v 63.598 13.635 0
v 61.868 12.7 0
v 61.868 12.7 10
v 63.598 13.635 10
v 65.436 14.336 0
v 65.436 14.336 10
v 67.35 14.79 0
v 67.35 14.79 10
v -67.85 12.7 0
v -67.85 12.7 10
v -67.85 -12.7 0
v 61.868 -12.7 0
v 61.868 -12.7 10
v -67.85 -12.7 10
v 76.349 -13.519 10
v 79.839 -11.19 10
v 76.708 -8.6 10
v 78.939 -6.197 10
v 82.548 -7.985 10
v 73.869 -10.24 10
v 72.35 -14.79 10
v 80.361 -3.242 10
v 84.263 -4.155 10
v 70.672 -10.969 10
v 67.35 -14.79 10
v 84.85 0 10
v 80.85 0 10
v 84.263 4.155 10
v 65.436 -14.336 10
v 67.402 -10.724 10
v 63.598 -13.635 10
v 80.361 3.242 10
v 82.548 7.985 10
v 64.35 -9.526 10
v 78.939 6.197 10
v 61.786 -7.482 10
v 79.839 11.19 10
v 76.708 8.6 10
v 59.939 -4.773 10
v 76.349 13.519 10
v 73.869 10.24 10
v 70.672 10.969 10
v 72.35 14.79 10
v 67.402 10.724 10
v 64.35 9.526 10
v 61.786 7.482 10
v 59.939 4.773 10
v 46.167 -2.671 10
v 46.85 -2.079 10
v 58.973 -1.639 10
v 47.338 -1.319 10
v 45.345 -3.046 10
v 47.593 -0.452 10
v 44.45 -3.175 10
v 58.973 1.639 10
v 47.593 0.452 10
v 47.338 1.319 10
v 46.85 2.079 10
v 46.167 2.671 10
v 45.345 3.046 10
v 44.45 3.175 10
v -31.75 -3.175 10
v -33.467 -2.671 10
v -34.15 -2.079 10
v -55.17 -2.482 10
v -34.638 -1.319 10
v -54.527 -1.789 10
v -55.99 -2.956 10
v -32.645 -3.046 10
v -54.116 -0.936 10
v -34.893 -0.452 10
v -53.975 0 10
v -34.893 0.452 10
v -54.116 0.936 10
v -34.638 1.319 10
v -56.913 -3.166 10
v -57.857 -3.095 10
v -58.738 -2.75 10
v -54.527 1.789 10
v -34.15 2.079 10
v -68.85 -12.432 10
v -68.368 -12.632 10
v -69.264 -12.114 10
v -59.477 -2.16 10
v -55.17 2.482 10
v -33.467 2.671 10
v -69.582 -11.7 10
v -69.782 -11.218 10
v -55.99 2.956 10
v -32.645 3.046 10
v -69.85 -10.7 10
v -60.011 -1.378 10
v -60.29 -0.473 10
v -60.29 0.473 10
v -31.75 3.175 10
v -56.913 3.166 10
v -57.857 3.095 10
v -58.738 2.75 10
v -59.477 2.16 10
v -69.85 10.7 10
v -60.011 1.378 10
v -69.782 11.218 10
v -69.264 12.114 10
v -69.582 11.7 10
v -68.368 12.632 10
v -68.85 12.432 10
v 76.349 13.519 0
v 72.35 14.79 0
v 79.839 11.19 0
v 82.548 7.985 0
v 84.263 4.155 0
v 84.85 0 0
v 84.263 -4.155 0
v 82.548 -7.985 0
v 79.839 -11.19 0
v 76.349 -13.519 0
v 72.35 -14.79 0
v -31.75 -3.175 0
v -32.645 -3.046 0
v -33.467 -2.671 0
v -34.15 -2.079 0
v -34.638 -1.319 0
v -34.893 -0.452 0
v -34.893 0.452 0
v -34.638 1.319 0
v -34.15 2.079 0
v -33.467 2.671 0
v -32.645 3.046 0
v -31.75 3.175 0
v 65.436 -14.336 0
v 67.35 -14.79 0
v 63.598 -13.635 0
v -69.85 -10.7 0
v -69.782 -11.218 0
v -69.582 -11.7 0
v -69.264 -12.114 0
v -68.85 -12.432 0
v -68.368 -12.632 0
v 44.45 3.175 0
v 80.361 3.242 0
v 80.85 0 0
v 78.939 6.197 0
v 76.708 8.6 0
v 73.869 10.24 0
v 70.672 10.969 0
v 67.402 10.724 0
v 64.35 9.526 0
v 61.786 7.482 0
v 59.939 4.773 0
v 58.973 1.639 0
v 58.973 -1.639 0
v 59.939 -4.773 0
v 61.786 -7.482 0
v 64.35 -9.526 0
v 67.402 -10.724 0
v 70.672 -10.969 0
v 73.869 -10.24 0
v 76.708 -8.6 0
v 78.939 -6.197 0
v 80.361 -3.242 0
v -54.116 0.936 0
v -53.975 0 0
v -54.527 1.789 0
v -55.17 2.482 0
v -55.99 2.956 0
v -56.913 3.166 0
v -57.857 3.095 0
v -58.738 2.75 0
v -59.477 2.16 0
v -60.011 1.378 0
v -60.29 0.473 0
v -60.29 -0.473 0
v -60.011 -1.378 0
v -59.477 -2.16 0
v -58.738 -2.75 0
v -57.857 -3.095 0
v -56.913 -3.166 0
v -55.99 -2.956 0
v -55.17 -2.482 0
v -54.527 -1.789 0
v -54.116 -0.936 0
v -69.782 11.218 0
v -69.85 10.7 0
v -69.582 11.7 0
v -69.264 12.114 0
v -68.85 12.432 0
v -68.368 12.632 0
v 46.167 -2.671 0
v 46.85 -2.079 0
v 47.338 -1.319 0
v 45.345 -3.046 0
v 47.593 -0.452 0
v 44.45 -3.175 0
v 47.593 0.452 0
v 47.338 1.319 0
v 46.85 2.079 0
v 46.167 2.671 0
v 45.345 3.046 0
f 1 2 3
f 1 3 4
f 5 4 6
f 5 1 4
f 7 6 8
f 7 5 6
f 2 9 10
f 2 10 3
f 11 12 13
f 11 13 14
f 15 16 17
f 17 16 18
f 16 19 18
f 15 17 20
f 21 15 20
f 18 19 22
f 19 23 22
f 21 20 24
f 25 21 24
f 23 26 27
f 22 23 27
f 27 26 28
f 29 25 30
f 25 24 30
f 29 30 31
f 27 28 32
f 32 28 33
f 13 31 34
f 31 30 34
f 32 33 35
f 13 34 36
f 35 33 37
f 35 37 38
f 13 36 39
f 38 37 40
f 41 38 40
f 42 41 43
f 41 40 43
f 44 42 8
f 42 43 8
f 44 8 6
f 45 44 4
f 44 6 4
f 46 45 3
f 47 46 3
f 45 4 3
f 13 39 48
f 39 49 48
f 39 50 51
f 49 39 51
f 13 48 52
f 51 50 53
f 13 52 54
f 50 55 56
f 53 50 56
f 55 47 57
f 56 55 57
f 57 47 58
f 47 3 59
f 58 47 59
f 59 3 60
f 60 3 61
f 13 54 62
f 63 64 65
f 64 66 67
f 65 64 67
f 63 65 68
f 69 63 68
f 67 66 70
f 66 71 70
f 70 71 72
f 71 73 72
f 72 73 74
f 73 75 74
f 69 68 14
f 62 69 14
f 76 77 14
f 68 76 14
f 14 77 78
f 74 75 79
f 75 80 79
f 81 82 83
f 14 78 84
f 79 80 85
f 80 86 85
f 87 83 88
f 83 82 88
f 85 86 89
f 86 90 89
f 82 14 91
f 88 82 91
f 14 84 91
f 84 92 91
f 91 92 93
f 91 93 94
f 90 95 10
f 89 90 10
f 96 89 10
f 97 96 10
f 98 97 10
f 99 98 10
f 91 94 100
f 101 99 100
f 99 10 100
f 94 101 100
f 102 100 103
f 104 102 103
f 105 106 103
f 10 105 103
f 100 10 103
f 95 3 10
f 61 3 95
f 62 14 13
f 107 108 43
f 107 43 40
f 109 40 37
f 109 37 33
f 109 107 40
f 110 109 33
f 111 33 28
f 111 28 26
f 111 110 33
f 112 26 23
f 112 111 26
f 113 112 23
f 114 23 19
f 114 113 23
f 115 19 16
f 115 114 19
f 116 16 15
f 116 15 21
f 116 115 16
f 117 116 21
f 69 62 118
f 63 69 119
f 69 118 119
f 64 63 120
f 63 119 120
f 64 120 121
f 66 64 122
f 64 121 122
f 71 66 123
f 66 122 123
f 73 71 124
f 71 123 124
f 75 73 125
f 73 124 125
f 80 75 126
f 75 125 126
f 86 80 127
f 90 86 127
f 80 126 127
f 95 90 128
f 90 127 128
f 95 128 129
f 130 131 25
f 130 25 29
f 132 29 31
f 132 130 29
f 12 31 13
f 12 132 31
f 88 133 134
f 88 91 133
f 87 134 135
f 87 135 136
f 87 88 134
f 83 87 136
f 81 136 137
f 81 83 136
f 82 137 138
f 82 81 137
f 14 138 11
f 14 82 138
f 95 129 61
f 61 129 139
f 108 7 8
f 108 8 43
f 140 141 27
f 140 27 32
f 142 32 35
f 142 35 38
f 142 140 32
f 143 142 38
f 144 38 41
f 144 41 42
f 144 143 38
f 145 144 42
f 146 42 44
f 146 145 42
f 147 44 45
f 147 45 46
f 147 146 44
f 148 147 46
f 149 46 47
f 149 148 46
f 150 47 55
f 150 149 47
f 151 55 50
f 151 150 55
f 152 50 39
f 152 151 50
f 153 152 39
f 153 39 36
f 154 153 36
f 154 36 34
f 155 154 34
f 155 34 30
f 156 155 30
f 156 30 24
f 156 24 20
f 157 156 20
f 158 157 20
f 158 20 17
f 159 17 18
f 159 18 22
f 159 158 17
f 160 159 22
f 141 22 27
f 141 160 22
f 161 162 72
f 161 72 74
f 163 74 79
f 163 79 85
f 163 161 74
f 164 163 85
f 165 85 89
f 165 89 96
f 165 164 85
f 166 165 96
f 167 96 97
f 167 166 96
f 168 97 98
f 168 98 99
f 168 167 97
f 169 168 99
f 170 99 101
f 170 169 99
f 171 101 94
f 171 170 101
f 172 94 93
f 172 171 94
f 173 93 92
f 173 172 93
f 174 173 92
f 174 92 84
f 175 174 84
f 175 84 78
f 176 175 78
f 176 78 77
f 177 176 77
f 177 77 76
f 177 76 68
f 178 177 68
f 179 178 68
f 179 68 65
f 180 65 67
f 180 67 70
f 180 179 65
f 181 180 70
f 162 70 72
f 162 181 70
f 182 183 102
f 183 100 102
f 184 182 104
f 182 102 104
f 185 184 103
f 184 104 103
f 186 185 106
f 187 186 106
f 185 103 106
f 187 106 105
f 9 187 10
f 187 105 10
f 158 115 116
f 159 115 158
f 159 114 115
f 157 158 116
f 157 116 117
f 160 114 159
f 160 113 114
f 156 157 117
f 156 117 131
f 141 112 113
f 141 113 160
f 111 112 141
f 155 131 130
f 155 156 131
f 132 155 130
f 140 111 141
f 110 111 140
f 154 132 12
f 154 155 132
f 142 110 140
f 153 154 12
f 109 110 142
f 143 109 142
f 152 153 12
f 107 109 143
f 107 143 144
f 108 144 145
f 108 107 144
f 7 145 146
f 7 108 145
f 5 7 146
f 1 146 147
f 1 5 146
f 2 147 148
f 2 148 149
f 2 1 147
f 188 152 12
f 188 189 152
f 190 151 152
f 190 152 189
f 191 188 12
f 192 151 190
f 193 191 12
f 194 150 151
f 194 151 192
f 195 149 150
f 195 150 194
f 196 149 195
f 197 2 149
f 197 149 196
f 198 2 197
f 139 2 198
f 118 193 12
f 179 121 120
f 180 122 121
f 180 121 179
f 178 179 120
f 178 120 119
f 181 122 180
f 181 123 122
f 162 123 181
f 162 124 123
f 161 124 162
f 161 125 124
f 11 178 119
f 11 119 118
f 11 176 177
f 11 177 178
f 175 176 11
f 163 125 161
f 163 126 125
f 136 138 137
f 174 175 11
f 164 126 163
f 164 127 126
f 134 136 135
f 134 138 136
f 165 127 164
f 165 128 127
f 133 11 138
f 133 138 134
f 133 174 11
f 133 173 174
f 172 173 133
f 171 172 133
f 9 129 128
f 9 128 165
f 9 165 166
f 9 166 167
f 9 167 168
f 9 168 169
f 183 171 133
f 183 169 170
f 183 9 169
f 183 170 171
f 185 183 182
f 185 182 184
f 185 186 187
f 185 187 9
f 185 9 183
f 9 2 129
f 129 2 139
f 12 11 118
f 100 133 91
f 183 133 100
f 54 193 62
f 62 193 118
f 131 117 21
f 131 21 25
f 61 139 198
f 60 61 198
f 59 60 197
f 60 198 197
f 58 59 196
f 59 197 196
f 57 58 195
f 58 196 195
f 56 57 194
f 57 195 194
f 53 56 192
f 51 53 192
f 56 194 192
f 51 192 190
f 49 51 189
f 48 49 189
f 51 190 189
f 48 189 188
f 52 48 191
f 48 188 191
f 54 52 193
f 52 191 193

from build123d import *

# Parameters (mm, degrees)
SKETCH1_R           = 3.175
SKETCH1_R_2         = 11
BOSS_EXTRUDE1_DEPTH = 10
FILLET3_R           = 2


with BuildPart() as part:
    # Sketch1 → Boss-Extrude1 (new body)
    with BuildSketch(Plane.XY):
        with BuildLine():
            Line((-69.85, -12.7), (-69.85, 12.7))
            Line((-69.85, 12.7), (61.868145579, 12.7))
            ThreePointArc((61.868145579, 12.7), (64.505886278, 14.015721477), (67.35, 14.790199458))
            Line((67.35, 14.790199458), (72.35, 14.790199458))
            ThreePointArc((72.35, 14.790199458), (84.85, 0), (72.35, -14.790199458))
            Line((72.35, -14.790199458), (67.35, -14.790199458))
            ThreePointArc((67.35, -14.790199458), (64.505886278, -14.015721477), (61.868145579, -12.7))
            Line((61.868145579, -12.7), (-69.85, -12.7))
        make_face()
        with Locations((-57.15, 0)):
            Circle(SKETCH1_R, mode=Mode.SUBTRACT)
        with Locations((69.85, 0)):
            Circle(SKETCH1_R_2, mode=Mode.SUBTRACT)
        with BuildLine():
            Line((-31.75, 3.175), (44.45, 3.175))
            ThreePointArc((44.45, 3.175), (47.625, 0), (44.45, -3.175))
            Line((44.45, -3.175), (-31.75, -3.175))
            ThreePointArc((-31.75, -3.175), (-34.925, 0), (-31.75, 3.175))
        make_face(mode=Mode.SUBTRACT)
    extrude(amount=BOSS_EXTRUDE1_DEPTH)

    # Fillet3
    fillet3_edges = [part.edges().sort_by_distance(p)[0] for p in [
        (-69.85, -12.7, 5),
        (-69.85, 12.7, 5),
    ]]
    fillet(fillet3_edges, radius=FILLET3_R)


solid = part.part
